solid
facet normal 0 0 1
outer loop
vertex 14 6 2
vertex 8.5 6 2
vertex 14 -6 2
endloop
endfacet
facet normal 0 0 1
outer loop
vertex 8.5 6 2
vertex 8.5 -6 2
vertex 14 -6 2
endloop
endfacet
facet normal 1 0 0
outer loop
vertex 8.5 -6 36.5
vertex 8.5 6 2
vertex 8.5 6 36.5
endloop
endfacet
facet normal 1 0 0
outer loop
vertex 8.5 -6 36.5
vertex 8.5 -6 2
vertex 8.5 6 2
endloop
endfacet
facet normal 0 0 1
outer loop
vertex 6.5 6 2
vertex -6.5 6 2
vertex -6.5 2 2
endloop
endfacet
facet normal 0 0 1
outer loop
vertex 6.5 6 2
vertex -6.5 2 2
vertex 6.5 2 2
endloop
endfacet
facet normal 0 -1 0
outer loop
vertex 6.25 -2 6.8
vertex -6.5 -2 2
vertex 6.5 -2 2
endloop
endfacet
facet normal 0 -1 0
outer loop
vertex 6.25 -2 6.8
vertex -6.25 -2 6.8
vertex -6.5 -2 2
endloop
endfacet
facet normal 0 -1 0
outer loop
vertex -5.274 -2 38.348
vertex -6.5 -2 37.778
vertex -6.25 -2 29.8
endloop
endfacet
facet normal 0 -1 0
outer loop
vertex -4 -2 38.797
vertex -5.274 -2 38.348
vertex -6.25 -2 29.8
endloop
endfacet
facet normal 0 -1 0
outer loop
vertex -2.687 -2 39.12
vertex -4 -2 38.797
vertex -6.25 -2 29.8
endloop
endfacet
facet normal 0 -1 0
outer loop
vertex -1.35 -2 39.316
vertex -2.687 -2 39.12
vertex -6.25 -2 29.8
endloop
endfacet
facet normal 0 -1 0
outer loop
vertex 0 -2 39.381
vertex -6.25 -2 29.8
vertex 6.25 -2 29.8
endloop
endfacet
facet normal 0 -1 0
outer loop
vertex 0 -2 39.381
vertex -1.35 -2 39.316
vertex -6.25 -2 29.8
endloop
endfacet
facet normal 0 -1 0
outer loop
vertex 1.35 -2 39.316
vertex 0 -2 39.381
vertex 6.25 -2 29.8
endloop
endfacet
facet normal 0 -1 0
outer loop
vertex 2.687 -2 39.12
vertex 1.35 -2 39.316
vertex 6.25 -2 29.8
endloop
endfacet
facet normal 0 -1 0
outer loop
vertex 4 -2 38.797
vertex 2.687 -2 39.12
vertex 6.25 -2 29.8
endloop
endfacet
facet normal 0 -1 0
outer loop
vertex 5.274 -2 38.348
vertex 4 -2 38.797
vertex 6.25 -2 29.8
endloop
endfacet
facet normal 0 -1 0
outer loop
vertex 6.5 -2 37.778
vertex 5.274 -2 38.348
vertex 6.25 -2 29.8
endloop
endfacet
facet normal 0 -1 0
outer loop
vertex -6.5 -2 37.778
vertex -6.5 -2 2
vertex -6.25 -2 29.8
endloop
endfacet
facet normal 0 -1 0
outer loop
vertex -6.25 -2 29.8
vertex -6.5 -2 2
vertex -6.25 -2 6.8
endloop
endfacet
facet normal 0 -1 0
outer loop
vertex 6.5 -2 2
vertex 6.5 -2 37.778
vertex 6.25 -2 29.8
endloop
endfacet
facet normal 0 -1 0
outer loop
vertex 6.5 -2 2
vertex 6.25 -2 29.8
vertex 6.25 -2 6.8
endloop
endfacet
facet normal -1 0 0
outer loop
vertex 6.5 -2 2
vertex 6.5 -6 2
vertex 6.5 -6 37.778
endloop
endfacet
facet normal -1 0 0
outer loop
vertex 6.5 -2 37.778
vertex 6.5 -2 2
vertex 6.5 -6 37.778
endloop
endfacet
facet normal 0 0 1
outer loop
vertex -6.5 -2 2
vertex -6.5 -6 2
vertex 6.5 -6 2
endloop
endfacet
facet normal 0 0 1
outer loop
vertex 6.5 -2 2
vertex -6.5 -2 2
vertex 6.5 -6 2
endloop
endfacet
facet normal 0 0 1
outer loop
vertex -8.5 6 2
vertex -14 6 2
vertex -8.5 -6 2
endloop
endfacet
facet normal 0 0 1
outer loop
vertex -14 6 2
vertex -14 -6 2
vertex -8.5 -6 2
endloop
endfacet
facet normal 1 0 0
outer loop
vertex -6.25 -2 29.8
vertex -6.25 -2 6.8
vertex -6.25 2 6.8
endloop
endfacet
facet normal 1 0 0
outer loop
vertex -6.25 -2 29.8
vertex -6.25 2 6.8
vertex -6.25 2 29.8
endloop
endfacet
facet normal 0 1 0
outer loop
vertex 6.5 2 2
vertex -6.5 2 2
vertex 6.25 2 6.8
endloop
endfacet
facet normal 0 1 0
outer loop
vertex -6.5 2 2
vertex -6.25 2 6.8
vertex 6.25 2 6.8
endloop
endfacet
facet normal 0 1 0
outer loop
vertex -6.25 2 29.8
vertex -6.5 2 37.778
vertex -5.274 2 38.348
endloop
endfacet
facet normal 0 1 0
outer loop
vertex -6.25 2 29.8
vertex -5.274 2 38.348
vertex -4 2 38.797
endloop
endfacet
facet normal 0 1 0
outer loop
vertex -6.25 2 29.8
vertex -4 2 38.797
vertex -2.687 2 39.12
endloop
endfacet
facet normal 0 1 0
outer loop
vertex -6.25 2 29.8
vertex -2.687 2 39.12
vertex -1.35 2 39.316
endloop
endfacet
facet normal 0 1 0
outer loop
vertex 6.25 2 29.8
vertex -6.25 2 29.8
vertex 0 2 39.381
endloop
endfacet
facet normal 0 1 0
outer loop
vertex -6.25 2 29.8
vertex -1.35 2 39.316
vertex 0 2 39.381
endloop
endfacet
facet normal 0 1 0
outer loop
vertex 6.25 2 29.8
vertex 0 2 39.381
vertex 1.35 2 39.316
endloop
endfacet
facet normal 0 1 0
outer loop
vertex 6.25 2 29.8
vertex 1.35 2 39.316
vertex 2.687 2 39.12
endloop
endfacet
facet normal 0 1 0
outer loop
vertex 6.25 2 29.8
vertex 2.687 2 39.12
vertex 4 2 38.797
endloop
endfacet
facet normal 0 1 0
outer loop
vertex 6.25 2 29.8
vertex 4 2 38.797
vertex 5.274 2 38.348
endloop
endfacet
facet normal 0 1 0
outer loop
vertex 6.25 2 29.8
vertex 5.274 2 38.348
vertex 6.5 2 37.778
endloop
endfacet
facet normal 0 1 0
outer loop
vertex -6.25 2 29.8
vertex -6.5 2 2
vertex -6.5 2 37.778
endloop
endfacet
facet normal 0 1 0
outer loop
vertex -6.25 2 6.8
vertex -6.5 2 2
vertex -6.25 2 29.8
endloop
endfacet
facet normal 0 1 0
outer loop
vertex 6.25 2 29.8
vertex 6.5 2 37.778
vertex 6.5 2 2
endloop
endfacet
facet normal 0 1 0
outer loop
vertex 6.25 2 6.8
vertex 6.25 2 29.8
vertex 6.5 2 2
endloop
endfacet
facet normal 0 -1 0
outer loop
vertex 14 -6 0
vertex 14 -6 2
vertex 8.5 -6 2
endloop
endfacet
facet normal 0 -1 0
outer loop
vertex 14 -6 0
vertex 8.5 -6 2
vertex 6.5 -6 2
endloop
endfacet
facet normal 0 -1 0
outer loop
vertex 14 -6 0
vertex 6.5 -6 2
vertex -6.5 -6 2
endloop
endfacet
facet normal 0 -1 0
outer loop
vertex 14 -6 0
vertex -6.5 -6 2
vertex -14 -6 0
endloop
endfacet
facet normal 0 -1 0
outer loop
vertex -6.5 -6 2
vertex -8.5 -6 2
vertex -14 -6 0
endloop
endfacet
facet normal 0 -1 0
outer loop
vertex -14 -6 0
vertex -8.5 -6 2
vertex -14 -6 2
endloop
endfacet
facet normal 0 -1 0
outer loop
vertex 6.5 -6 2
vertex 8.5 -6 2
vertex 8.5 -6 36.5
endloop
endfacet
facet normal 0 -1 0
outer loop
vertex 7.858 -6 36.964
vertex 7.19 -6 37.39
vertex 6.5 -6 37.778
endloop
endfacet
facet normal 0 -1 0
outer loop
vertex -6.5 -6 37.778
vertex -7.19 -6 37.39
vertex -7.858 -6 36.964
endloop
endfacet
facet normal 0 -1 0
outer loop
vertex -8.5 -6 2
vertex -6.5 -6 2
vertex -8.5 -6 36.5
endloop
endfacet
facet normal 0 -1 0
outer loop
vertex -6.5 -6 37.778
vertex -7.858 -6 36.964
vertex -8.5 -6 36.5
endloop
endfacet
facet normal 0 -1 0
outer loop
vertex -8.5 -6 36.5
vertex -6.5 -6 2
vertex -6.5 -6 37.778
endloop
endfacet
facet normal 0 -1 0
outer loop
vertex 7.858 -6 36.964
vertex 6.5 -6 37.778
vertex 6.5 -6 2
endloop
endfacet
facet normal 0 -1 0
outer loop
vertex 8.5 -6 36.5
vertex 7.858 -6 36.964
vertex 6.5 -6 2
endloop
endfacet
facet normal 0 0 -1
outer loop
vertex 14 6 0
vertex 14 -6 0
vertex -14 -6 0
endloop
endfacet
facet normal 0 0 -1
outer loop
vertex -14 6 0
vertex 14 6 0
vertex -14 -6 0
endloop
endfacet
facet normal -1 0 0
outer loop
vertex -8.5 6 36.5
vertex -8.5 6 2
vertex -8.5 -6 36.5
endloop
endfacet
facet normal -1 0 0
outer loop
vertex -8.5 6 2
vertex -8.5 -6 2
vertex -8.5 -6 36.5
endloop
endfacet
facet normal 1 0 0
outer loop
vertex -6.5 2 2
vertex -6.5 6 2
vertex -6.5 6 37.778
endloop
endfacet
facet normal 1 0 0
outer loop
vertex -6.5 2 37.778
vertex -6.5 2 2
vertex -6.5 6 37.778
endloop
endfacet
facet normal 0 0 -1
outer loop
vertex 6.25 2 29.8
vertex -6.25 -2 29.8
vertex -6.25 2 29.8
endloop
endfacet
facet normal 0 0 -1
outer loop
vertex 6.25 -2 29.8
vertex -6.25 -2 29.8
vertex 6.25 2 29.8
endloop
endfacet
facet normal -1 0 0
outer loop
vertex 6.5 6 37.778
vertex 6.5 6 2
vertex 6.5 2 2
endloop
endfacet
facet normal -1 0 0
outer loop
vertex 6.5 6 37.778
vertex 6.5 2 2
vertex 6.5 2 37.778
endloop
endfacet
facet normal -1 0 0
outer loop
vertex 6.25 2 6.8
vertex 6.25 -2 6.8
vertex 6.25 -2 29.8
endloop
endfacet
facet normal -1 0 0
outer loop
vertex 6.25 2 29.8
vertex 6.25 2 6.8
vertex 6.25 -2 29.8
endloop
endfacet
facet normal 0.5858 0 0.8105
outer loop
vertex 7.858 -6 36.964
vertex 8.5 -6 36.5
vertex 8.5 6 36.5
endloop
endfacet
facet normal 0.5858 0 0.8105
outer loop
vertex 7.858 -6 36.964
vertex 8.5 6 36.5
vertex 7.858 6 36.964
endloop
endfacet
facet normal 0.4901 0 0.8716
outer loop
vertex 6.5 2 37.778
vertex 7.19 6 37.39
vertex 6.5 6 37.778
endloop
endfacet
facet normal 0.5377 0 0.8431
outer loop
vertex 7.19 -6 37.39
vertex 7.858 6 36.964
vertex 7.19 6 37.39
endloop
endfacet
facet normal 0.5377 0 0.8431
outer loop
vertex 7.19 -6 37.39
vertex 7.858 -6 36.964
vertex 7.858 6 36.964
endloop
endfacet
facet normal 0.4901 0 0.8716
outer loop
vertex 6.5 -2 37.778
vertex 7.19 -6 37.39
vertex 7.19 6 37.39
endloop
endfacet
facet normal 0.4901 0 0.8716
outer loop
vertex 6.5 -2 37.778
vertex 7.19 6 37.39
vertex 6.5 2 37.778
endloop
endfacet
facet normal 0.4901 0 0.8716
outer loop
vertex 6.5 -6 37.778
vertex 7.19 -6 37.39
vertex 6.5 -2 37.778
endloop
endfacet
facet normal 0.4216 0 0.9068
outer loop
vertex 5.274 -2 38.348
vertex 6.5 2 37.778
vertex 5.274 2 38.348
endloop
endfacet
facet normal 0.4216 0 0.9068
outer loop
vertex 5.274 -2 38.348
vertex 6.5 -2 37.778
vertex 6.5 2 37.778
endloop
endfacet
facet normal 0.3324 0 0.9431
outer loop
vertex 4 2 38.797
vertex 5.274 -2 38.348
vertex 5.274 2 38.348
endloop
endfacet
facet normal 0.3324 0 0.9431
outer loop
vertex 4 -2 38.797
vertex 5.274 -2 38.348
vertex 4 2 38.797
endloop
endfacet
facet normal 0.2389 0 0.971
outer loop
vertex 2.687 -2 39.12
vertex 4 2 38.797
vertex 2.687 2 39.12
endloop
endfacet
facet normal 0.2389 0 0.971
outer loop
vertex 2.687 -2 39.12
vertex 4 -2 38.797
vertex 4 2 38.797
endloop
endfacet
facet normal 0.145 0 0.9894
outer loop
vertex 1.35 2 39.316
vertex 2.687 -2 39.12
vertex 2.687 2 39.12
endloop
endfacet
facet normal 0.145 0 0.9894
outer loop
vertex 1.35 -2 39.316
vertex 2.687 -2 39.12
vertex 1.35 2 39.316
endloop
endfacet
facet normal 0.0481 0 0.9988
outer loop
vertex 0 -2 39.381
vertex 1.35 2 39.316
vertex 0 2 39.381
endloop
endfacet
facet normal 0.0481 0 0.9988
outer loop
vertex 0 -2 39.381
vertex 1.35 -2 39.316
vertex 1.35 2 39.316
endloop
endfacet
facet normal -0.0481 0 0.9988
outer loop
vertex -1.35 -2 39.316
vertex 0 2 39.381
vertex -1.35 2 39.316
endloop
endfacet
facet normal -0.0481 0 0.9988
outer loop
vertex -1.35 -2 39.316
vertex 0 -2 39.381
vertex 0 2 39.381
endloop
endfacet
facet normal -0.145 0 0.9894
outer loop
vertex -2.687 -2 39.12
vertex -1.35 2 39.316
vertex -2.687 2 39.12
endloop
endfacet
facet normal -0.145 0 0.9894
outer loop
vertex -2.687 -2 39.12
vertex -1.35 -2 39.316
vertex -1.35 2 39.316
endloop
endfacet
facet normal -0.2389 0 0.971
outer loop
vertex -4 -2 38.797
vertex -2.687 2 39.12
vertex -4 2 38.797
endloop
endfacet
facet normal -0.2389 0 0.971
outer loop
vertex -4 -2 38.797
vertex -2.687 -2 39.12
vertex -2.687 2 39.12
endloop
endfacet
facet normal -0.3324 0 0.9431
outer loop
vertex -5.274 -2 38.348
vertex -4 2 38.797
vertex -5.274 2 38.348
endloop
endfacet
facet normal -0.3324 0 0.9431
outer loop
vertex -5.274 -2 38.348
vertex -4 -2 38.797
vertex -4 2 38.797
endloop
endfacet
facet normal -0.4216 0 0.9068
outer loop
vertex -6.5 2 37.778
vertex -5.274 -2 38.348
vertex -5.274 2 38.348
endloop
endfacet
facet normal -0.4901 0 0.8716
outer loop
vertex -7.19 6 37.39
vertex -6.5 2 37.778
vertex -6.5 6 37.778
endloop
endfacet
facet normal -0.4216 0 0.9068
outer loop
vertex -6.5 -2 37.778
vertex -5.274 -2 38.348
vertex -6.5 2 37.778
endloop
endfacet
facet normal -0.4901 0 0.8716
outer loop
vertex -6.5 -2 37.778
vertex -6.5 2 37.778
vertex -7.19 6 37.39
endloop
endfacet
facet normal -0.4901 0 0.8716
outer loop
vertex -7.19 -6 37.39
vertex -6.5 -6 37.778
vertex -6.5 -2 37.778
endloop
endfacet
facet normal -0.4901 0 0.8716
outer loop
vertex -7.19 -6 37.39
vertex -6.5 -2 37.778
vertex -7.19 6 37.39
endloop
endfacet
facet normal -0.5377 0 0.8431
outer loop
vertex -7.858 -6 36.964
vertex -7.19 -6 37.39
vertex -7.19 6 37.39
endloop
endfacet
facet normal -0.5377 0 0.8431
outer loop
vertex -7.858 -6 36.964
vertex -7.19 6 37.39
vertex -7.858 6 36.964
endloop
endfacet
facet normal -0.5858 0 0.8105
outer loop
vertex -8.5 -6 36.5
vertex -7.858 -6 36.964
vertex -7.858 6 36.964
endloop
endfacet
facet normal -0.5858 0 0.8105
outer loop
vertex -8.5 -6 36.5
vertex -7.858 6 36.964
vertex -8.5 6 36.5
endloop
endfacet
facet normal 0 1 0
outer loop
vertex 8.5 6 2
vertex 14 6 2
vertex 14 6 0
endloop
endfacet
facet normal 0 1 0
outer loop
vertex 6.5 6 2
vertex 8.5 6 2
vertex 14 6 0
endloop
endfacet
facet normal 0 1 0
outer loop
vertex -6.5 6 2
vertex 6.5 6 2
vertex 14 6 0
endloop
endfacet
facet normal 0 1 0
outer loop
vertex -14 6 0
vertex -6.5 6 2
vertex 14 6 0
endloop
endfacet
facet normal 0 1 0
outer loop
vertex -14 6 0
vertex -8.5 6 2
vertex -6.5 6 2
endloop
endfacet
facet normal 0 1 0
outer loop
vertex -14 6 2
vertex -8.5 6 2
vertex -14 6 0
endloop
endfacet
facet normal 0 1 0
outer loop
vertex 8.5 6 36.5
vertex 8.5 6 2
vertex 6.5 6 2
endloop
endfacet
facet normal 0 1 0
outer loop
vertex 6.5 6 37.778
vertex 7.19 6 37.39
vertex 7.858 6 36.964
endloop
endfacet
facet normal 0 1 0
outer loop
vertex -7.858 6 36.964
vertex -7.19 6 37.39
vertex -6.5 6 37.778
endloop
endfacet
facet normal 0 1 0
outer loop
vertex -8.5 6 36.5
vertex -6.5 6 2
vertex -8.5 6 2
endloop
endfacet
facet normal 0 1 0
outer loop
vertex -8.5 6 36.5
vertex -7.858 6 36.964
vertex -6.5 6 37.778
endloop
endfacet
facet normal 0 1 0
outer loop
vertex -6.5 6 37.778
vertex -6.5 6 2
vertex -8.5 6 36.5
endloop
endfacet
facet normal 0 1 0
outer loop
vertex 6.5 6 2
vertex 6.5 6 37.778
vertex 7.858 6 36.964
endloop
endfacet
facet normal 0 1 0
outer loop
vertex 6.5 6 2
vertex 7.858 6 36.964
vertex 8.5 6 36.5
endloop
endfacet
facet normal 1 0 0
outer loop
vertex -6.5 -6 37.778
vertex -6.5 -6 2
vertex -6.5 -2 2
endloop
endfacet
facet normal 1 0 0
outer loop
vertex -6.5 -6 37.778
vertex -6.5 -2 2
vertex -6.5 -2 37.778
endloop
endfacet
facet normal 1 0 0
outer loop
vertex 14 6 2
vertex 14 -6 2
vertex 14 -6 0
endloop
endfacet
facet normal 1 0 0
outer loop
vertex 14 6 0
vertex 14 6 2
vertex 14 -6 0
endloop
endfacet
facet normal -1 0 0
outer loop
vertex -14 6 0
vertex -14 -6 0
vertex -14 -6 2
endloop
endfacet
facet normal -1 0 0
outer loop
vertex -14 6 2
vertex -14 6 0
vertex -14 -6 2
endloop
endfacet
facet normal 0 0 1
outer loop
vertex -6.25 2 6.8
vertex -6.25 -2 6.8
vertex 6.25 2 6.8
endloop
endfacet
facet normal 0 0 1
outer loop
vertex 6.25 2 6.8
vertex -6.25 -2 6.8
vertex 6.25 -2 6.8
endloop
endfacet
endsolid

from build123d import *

# Parameters (mm, degrees)
PAD_DEPTH       = 6
SKETCH001_W     = 12.5
SKETCH001_H     = 23
POCKET_DEPTH    = 12.001
SKETCH002_W     = 13
SKETCH002_H     = 39
POCKET001_DEPTH = 4


with BuildPart() as part:
    # Sketch → Pad (new body, symmetric)
    with BuildSketch(Plane.XZ):
        with BuildLine():
            Line((-14, 0), (-14, 2))
            Line((-14, 2), (-8.5, 2))
            Line((-8.5, 2), (-8.5, 36.5))
            ThreePointArc((8.5, 36.5), (0, 39.380883), (-8.5, 36.5))
            Line((8.5, 2), (8.5, 36.5))
            Line((8.5, 2), (14, 2))
            Line((14, 2), (14, 0))
            Line((14, 0), (-14, 0))
        make_face()
    extrude(amount=PAD_DEPTH, both=True)

    # Sketch001 (on Face10 of Pad) → Pocket (cut, through all)
    with BuildSketch(Plane.XZ.offset(6)):
        with Locations((0, 18.3)):
            Rectangle(SKETCH001_W, SKETCH001_H)
    extrude(amount=-POCKET_DEPTH, mode=Mode.SUBTRACT)

    # Sketch002 (on Face5 of Pocket) → Pocket001 (cut)
    with BuildSketch(Plane.XZ.offset(6)):
        with Locations((0, 21.5)):
            Rectangle(SKETCH002_W, SKETCH002_H)
    pocket001 = extrude(amount=-POCKET001_DEPTH, mode=Mode.SUBTRACT)

    # Mirrored: Pocket001 across XZ
    add(pocket001.mirror(Plane.XZ), mode=Mode.SUBTRACT)


solid = part.part
